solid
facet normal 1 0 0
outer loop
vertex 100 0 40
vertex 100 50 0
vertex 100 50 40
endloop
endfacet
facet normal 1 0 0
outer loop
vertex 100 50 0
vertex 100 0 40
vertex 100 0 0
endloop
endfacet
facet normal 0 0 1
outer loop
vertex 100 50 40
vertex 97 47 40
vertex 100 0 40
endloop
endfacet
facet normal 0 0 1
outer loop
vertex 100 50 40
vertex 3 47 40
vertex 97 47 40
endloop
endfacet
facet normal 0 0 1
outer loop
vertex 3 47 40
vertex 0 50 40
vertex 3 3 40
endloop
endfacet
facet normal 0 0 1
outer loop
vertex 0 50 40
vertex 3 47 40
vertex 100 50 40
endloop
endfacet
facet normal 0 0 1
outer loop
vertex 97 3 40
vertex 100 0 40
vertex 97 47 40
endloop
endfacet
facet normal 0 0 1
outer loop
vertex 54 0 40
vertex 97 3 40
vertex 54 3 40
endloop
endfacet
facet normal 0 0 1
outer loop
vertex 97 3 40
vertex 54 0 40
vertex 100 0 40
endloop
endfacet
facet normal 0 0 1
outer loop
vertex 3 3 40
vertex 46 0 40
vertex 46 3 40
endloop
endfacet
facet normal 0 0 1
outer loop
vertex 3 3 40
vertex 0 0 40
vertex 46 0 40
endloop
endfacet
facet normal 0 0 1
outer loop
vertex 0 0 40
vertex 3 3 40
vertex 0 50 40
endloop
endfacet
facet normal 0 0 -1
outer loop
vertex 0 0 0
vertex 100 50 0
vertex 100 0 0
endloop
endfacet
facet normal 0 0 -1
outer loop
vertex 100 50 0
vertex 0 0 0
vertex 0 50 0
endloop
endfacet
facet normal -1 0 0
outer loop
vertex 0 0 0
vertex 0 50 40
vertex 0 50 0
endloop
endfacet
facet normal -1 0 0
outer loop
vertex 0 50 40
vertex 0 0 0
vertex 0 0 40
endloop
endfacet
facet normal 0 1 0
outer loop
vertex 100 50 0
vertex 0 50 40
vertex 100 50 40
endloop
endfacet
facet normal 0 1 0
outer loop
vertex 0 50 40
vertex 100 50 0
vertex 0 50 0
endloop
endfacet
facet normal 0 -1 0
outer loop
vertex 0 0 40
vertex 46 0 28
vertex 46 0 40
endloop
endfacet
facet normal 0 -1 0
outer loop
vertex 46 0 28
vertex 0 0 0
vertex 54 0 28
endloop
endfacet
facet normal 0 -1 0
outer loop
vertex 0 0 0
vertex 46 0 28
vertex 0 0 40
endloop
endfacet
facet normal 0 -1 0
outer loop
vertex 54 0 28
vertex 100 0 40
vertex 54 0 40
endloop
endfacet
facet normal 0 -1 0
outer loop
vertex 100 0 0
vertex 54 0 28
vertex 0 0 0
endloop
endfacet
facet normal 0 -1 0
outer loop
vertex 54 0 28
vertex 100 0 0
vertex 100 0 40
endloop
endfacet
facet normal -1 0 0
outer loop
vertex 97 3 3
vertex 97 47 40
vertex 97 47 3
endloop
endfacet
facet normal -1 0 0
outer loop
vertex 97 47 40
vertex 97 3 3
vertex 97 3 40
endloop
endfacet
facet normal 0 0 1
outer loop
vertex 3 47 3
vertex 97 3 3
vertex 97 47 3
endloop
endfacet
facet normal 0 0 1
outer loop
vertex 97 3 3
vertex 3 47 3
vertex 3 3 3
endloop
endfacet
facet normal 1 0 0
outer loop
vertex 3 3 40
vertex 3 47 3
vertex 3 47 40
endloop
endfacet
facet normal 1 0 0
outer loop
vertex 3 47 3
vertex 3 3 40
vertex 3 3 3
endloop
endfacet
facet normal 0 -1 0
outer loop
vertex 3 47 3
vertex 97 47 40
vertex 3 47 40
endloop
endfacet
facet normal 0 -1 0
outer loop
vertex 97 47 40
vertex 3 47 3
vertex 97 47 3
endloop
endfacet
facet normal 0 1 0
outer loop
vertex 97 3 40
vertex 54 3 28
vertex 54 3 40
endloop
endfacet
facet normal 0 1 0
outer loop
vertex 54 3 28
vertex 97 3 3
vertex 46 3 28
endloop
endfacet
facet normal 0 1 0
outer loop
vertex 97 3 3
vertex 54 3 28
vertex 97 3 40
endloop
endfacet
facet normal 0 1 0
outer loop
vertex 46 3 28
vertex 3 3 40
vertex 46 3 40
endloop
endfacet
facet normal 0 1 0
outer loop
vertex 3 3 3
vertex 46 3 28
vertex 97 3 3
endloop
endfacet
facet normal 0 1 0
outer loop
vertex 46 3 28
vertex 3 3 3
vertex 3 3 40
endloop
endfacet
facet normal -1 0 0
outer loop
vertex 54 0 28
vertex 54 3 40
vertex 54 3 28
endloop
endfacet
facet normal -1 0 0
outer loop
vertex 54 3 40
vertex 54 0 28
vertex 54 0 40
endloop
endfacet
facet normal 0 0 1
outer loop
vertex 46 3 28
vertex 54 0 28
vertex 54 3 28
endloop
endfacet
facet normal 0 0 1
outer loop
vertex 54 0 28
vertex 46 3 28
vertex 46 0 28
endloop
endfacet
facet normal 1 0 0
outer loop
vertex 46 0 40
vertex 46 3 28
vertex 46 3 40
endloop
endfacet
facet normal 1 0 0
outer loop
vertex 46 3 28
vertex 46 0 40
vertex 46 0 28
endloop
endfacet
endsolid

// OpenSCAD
$fn = 32;

// ----------------------------------------------------------------------
// Enclosure box: notch enclosure
// ----------------------------------------------------------------------

// --- parameters (mm) ---
box_l = 100;              // outer length, X
box_w = 50;               // outer width, Y
box_h = 40;               // outer height
wall_t = 3;               // wall thickness
notch_w = 8;              // cable notch width
notch_h = 12;             // cable notch height

inner_h = box_h - wall_t;  // cavity depth
boss_h = inner_h - 2;  // corner boss height

difference() {
  cube([box_l, box_w, box_h]);
  translate([wall_t, wall_t, wall_t])
    cube([box_l - 2 * wall_t, box_w - 2 * wall_t, box_h]);
  translate([box_l / 2 - notch_w / 2, -1, box_h - notch_h])
    cube([notch_w, wall_t + 2, notch_h + 1]);
}
